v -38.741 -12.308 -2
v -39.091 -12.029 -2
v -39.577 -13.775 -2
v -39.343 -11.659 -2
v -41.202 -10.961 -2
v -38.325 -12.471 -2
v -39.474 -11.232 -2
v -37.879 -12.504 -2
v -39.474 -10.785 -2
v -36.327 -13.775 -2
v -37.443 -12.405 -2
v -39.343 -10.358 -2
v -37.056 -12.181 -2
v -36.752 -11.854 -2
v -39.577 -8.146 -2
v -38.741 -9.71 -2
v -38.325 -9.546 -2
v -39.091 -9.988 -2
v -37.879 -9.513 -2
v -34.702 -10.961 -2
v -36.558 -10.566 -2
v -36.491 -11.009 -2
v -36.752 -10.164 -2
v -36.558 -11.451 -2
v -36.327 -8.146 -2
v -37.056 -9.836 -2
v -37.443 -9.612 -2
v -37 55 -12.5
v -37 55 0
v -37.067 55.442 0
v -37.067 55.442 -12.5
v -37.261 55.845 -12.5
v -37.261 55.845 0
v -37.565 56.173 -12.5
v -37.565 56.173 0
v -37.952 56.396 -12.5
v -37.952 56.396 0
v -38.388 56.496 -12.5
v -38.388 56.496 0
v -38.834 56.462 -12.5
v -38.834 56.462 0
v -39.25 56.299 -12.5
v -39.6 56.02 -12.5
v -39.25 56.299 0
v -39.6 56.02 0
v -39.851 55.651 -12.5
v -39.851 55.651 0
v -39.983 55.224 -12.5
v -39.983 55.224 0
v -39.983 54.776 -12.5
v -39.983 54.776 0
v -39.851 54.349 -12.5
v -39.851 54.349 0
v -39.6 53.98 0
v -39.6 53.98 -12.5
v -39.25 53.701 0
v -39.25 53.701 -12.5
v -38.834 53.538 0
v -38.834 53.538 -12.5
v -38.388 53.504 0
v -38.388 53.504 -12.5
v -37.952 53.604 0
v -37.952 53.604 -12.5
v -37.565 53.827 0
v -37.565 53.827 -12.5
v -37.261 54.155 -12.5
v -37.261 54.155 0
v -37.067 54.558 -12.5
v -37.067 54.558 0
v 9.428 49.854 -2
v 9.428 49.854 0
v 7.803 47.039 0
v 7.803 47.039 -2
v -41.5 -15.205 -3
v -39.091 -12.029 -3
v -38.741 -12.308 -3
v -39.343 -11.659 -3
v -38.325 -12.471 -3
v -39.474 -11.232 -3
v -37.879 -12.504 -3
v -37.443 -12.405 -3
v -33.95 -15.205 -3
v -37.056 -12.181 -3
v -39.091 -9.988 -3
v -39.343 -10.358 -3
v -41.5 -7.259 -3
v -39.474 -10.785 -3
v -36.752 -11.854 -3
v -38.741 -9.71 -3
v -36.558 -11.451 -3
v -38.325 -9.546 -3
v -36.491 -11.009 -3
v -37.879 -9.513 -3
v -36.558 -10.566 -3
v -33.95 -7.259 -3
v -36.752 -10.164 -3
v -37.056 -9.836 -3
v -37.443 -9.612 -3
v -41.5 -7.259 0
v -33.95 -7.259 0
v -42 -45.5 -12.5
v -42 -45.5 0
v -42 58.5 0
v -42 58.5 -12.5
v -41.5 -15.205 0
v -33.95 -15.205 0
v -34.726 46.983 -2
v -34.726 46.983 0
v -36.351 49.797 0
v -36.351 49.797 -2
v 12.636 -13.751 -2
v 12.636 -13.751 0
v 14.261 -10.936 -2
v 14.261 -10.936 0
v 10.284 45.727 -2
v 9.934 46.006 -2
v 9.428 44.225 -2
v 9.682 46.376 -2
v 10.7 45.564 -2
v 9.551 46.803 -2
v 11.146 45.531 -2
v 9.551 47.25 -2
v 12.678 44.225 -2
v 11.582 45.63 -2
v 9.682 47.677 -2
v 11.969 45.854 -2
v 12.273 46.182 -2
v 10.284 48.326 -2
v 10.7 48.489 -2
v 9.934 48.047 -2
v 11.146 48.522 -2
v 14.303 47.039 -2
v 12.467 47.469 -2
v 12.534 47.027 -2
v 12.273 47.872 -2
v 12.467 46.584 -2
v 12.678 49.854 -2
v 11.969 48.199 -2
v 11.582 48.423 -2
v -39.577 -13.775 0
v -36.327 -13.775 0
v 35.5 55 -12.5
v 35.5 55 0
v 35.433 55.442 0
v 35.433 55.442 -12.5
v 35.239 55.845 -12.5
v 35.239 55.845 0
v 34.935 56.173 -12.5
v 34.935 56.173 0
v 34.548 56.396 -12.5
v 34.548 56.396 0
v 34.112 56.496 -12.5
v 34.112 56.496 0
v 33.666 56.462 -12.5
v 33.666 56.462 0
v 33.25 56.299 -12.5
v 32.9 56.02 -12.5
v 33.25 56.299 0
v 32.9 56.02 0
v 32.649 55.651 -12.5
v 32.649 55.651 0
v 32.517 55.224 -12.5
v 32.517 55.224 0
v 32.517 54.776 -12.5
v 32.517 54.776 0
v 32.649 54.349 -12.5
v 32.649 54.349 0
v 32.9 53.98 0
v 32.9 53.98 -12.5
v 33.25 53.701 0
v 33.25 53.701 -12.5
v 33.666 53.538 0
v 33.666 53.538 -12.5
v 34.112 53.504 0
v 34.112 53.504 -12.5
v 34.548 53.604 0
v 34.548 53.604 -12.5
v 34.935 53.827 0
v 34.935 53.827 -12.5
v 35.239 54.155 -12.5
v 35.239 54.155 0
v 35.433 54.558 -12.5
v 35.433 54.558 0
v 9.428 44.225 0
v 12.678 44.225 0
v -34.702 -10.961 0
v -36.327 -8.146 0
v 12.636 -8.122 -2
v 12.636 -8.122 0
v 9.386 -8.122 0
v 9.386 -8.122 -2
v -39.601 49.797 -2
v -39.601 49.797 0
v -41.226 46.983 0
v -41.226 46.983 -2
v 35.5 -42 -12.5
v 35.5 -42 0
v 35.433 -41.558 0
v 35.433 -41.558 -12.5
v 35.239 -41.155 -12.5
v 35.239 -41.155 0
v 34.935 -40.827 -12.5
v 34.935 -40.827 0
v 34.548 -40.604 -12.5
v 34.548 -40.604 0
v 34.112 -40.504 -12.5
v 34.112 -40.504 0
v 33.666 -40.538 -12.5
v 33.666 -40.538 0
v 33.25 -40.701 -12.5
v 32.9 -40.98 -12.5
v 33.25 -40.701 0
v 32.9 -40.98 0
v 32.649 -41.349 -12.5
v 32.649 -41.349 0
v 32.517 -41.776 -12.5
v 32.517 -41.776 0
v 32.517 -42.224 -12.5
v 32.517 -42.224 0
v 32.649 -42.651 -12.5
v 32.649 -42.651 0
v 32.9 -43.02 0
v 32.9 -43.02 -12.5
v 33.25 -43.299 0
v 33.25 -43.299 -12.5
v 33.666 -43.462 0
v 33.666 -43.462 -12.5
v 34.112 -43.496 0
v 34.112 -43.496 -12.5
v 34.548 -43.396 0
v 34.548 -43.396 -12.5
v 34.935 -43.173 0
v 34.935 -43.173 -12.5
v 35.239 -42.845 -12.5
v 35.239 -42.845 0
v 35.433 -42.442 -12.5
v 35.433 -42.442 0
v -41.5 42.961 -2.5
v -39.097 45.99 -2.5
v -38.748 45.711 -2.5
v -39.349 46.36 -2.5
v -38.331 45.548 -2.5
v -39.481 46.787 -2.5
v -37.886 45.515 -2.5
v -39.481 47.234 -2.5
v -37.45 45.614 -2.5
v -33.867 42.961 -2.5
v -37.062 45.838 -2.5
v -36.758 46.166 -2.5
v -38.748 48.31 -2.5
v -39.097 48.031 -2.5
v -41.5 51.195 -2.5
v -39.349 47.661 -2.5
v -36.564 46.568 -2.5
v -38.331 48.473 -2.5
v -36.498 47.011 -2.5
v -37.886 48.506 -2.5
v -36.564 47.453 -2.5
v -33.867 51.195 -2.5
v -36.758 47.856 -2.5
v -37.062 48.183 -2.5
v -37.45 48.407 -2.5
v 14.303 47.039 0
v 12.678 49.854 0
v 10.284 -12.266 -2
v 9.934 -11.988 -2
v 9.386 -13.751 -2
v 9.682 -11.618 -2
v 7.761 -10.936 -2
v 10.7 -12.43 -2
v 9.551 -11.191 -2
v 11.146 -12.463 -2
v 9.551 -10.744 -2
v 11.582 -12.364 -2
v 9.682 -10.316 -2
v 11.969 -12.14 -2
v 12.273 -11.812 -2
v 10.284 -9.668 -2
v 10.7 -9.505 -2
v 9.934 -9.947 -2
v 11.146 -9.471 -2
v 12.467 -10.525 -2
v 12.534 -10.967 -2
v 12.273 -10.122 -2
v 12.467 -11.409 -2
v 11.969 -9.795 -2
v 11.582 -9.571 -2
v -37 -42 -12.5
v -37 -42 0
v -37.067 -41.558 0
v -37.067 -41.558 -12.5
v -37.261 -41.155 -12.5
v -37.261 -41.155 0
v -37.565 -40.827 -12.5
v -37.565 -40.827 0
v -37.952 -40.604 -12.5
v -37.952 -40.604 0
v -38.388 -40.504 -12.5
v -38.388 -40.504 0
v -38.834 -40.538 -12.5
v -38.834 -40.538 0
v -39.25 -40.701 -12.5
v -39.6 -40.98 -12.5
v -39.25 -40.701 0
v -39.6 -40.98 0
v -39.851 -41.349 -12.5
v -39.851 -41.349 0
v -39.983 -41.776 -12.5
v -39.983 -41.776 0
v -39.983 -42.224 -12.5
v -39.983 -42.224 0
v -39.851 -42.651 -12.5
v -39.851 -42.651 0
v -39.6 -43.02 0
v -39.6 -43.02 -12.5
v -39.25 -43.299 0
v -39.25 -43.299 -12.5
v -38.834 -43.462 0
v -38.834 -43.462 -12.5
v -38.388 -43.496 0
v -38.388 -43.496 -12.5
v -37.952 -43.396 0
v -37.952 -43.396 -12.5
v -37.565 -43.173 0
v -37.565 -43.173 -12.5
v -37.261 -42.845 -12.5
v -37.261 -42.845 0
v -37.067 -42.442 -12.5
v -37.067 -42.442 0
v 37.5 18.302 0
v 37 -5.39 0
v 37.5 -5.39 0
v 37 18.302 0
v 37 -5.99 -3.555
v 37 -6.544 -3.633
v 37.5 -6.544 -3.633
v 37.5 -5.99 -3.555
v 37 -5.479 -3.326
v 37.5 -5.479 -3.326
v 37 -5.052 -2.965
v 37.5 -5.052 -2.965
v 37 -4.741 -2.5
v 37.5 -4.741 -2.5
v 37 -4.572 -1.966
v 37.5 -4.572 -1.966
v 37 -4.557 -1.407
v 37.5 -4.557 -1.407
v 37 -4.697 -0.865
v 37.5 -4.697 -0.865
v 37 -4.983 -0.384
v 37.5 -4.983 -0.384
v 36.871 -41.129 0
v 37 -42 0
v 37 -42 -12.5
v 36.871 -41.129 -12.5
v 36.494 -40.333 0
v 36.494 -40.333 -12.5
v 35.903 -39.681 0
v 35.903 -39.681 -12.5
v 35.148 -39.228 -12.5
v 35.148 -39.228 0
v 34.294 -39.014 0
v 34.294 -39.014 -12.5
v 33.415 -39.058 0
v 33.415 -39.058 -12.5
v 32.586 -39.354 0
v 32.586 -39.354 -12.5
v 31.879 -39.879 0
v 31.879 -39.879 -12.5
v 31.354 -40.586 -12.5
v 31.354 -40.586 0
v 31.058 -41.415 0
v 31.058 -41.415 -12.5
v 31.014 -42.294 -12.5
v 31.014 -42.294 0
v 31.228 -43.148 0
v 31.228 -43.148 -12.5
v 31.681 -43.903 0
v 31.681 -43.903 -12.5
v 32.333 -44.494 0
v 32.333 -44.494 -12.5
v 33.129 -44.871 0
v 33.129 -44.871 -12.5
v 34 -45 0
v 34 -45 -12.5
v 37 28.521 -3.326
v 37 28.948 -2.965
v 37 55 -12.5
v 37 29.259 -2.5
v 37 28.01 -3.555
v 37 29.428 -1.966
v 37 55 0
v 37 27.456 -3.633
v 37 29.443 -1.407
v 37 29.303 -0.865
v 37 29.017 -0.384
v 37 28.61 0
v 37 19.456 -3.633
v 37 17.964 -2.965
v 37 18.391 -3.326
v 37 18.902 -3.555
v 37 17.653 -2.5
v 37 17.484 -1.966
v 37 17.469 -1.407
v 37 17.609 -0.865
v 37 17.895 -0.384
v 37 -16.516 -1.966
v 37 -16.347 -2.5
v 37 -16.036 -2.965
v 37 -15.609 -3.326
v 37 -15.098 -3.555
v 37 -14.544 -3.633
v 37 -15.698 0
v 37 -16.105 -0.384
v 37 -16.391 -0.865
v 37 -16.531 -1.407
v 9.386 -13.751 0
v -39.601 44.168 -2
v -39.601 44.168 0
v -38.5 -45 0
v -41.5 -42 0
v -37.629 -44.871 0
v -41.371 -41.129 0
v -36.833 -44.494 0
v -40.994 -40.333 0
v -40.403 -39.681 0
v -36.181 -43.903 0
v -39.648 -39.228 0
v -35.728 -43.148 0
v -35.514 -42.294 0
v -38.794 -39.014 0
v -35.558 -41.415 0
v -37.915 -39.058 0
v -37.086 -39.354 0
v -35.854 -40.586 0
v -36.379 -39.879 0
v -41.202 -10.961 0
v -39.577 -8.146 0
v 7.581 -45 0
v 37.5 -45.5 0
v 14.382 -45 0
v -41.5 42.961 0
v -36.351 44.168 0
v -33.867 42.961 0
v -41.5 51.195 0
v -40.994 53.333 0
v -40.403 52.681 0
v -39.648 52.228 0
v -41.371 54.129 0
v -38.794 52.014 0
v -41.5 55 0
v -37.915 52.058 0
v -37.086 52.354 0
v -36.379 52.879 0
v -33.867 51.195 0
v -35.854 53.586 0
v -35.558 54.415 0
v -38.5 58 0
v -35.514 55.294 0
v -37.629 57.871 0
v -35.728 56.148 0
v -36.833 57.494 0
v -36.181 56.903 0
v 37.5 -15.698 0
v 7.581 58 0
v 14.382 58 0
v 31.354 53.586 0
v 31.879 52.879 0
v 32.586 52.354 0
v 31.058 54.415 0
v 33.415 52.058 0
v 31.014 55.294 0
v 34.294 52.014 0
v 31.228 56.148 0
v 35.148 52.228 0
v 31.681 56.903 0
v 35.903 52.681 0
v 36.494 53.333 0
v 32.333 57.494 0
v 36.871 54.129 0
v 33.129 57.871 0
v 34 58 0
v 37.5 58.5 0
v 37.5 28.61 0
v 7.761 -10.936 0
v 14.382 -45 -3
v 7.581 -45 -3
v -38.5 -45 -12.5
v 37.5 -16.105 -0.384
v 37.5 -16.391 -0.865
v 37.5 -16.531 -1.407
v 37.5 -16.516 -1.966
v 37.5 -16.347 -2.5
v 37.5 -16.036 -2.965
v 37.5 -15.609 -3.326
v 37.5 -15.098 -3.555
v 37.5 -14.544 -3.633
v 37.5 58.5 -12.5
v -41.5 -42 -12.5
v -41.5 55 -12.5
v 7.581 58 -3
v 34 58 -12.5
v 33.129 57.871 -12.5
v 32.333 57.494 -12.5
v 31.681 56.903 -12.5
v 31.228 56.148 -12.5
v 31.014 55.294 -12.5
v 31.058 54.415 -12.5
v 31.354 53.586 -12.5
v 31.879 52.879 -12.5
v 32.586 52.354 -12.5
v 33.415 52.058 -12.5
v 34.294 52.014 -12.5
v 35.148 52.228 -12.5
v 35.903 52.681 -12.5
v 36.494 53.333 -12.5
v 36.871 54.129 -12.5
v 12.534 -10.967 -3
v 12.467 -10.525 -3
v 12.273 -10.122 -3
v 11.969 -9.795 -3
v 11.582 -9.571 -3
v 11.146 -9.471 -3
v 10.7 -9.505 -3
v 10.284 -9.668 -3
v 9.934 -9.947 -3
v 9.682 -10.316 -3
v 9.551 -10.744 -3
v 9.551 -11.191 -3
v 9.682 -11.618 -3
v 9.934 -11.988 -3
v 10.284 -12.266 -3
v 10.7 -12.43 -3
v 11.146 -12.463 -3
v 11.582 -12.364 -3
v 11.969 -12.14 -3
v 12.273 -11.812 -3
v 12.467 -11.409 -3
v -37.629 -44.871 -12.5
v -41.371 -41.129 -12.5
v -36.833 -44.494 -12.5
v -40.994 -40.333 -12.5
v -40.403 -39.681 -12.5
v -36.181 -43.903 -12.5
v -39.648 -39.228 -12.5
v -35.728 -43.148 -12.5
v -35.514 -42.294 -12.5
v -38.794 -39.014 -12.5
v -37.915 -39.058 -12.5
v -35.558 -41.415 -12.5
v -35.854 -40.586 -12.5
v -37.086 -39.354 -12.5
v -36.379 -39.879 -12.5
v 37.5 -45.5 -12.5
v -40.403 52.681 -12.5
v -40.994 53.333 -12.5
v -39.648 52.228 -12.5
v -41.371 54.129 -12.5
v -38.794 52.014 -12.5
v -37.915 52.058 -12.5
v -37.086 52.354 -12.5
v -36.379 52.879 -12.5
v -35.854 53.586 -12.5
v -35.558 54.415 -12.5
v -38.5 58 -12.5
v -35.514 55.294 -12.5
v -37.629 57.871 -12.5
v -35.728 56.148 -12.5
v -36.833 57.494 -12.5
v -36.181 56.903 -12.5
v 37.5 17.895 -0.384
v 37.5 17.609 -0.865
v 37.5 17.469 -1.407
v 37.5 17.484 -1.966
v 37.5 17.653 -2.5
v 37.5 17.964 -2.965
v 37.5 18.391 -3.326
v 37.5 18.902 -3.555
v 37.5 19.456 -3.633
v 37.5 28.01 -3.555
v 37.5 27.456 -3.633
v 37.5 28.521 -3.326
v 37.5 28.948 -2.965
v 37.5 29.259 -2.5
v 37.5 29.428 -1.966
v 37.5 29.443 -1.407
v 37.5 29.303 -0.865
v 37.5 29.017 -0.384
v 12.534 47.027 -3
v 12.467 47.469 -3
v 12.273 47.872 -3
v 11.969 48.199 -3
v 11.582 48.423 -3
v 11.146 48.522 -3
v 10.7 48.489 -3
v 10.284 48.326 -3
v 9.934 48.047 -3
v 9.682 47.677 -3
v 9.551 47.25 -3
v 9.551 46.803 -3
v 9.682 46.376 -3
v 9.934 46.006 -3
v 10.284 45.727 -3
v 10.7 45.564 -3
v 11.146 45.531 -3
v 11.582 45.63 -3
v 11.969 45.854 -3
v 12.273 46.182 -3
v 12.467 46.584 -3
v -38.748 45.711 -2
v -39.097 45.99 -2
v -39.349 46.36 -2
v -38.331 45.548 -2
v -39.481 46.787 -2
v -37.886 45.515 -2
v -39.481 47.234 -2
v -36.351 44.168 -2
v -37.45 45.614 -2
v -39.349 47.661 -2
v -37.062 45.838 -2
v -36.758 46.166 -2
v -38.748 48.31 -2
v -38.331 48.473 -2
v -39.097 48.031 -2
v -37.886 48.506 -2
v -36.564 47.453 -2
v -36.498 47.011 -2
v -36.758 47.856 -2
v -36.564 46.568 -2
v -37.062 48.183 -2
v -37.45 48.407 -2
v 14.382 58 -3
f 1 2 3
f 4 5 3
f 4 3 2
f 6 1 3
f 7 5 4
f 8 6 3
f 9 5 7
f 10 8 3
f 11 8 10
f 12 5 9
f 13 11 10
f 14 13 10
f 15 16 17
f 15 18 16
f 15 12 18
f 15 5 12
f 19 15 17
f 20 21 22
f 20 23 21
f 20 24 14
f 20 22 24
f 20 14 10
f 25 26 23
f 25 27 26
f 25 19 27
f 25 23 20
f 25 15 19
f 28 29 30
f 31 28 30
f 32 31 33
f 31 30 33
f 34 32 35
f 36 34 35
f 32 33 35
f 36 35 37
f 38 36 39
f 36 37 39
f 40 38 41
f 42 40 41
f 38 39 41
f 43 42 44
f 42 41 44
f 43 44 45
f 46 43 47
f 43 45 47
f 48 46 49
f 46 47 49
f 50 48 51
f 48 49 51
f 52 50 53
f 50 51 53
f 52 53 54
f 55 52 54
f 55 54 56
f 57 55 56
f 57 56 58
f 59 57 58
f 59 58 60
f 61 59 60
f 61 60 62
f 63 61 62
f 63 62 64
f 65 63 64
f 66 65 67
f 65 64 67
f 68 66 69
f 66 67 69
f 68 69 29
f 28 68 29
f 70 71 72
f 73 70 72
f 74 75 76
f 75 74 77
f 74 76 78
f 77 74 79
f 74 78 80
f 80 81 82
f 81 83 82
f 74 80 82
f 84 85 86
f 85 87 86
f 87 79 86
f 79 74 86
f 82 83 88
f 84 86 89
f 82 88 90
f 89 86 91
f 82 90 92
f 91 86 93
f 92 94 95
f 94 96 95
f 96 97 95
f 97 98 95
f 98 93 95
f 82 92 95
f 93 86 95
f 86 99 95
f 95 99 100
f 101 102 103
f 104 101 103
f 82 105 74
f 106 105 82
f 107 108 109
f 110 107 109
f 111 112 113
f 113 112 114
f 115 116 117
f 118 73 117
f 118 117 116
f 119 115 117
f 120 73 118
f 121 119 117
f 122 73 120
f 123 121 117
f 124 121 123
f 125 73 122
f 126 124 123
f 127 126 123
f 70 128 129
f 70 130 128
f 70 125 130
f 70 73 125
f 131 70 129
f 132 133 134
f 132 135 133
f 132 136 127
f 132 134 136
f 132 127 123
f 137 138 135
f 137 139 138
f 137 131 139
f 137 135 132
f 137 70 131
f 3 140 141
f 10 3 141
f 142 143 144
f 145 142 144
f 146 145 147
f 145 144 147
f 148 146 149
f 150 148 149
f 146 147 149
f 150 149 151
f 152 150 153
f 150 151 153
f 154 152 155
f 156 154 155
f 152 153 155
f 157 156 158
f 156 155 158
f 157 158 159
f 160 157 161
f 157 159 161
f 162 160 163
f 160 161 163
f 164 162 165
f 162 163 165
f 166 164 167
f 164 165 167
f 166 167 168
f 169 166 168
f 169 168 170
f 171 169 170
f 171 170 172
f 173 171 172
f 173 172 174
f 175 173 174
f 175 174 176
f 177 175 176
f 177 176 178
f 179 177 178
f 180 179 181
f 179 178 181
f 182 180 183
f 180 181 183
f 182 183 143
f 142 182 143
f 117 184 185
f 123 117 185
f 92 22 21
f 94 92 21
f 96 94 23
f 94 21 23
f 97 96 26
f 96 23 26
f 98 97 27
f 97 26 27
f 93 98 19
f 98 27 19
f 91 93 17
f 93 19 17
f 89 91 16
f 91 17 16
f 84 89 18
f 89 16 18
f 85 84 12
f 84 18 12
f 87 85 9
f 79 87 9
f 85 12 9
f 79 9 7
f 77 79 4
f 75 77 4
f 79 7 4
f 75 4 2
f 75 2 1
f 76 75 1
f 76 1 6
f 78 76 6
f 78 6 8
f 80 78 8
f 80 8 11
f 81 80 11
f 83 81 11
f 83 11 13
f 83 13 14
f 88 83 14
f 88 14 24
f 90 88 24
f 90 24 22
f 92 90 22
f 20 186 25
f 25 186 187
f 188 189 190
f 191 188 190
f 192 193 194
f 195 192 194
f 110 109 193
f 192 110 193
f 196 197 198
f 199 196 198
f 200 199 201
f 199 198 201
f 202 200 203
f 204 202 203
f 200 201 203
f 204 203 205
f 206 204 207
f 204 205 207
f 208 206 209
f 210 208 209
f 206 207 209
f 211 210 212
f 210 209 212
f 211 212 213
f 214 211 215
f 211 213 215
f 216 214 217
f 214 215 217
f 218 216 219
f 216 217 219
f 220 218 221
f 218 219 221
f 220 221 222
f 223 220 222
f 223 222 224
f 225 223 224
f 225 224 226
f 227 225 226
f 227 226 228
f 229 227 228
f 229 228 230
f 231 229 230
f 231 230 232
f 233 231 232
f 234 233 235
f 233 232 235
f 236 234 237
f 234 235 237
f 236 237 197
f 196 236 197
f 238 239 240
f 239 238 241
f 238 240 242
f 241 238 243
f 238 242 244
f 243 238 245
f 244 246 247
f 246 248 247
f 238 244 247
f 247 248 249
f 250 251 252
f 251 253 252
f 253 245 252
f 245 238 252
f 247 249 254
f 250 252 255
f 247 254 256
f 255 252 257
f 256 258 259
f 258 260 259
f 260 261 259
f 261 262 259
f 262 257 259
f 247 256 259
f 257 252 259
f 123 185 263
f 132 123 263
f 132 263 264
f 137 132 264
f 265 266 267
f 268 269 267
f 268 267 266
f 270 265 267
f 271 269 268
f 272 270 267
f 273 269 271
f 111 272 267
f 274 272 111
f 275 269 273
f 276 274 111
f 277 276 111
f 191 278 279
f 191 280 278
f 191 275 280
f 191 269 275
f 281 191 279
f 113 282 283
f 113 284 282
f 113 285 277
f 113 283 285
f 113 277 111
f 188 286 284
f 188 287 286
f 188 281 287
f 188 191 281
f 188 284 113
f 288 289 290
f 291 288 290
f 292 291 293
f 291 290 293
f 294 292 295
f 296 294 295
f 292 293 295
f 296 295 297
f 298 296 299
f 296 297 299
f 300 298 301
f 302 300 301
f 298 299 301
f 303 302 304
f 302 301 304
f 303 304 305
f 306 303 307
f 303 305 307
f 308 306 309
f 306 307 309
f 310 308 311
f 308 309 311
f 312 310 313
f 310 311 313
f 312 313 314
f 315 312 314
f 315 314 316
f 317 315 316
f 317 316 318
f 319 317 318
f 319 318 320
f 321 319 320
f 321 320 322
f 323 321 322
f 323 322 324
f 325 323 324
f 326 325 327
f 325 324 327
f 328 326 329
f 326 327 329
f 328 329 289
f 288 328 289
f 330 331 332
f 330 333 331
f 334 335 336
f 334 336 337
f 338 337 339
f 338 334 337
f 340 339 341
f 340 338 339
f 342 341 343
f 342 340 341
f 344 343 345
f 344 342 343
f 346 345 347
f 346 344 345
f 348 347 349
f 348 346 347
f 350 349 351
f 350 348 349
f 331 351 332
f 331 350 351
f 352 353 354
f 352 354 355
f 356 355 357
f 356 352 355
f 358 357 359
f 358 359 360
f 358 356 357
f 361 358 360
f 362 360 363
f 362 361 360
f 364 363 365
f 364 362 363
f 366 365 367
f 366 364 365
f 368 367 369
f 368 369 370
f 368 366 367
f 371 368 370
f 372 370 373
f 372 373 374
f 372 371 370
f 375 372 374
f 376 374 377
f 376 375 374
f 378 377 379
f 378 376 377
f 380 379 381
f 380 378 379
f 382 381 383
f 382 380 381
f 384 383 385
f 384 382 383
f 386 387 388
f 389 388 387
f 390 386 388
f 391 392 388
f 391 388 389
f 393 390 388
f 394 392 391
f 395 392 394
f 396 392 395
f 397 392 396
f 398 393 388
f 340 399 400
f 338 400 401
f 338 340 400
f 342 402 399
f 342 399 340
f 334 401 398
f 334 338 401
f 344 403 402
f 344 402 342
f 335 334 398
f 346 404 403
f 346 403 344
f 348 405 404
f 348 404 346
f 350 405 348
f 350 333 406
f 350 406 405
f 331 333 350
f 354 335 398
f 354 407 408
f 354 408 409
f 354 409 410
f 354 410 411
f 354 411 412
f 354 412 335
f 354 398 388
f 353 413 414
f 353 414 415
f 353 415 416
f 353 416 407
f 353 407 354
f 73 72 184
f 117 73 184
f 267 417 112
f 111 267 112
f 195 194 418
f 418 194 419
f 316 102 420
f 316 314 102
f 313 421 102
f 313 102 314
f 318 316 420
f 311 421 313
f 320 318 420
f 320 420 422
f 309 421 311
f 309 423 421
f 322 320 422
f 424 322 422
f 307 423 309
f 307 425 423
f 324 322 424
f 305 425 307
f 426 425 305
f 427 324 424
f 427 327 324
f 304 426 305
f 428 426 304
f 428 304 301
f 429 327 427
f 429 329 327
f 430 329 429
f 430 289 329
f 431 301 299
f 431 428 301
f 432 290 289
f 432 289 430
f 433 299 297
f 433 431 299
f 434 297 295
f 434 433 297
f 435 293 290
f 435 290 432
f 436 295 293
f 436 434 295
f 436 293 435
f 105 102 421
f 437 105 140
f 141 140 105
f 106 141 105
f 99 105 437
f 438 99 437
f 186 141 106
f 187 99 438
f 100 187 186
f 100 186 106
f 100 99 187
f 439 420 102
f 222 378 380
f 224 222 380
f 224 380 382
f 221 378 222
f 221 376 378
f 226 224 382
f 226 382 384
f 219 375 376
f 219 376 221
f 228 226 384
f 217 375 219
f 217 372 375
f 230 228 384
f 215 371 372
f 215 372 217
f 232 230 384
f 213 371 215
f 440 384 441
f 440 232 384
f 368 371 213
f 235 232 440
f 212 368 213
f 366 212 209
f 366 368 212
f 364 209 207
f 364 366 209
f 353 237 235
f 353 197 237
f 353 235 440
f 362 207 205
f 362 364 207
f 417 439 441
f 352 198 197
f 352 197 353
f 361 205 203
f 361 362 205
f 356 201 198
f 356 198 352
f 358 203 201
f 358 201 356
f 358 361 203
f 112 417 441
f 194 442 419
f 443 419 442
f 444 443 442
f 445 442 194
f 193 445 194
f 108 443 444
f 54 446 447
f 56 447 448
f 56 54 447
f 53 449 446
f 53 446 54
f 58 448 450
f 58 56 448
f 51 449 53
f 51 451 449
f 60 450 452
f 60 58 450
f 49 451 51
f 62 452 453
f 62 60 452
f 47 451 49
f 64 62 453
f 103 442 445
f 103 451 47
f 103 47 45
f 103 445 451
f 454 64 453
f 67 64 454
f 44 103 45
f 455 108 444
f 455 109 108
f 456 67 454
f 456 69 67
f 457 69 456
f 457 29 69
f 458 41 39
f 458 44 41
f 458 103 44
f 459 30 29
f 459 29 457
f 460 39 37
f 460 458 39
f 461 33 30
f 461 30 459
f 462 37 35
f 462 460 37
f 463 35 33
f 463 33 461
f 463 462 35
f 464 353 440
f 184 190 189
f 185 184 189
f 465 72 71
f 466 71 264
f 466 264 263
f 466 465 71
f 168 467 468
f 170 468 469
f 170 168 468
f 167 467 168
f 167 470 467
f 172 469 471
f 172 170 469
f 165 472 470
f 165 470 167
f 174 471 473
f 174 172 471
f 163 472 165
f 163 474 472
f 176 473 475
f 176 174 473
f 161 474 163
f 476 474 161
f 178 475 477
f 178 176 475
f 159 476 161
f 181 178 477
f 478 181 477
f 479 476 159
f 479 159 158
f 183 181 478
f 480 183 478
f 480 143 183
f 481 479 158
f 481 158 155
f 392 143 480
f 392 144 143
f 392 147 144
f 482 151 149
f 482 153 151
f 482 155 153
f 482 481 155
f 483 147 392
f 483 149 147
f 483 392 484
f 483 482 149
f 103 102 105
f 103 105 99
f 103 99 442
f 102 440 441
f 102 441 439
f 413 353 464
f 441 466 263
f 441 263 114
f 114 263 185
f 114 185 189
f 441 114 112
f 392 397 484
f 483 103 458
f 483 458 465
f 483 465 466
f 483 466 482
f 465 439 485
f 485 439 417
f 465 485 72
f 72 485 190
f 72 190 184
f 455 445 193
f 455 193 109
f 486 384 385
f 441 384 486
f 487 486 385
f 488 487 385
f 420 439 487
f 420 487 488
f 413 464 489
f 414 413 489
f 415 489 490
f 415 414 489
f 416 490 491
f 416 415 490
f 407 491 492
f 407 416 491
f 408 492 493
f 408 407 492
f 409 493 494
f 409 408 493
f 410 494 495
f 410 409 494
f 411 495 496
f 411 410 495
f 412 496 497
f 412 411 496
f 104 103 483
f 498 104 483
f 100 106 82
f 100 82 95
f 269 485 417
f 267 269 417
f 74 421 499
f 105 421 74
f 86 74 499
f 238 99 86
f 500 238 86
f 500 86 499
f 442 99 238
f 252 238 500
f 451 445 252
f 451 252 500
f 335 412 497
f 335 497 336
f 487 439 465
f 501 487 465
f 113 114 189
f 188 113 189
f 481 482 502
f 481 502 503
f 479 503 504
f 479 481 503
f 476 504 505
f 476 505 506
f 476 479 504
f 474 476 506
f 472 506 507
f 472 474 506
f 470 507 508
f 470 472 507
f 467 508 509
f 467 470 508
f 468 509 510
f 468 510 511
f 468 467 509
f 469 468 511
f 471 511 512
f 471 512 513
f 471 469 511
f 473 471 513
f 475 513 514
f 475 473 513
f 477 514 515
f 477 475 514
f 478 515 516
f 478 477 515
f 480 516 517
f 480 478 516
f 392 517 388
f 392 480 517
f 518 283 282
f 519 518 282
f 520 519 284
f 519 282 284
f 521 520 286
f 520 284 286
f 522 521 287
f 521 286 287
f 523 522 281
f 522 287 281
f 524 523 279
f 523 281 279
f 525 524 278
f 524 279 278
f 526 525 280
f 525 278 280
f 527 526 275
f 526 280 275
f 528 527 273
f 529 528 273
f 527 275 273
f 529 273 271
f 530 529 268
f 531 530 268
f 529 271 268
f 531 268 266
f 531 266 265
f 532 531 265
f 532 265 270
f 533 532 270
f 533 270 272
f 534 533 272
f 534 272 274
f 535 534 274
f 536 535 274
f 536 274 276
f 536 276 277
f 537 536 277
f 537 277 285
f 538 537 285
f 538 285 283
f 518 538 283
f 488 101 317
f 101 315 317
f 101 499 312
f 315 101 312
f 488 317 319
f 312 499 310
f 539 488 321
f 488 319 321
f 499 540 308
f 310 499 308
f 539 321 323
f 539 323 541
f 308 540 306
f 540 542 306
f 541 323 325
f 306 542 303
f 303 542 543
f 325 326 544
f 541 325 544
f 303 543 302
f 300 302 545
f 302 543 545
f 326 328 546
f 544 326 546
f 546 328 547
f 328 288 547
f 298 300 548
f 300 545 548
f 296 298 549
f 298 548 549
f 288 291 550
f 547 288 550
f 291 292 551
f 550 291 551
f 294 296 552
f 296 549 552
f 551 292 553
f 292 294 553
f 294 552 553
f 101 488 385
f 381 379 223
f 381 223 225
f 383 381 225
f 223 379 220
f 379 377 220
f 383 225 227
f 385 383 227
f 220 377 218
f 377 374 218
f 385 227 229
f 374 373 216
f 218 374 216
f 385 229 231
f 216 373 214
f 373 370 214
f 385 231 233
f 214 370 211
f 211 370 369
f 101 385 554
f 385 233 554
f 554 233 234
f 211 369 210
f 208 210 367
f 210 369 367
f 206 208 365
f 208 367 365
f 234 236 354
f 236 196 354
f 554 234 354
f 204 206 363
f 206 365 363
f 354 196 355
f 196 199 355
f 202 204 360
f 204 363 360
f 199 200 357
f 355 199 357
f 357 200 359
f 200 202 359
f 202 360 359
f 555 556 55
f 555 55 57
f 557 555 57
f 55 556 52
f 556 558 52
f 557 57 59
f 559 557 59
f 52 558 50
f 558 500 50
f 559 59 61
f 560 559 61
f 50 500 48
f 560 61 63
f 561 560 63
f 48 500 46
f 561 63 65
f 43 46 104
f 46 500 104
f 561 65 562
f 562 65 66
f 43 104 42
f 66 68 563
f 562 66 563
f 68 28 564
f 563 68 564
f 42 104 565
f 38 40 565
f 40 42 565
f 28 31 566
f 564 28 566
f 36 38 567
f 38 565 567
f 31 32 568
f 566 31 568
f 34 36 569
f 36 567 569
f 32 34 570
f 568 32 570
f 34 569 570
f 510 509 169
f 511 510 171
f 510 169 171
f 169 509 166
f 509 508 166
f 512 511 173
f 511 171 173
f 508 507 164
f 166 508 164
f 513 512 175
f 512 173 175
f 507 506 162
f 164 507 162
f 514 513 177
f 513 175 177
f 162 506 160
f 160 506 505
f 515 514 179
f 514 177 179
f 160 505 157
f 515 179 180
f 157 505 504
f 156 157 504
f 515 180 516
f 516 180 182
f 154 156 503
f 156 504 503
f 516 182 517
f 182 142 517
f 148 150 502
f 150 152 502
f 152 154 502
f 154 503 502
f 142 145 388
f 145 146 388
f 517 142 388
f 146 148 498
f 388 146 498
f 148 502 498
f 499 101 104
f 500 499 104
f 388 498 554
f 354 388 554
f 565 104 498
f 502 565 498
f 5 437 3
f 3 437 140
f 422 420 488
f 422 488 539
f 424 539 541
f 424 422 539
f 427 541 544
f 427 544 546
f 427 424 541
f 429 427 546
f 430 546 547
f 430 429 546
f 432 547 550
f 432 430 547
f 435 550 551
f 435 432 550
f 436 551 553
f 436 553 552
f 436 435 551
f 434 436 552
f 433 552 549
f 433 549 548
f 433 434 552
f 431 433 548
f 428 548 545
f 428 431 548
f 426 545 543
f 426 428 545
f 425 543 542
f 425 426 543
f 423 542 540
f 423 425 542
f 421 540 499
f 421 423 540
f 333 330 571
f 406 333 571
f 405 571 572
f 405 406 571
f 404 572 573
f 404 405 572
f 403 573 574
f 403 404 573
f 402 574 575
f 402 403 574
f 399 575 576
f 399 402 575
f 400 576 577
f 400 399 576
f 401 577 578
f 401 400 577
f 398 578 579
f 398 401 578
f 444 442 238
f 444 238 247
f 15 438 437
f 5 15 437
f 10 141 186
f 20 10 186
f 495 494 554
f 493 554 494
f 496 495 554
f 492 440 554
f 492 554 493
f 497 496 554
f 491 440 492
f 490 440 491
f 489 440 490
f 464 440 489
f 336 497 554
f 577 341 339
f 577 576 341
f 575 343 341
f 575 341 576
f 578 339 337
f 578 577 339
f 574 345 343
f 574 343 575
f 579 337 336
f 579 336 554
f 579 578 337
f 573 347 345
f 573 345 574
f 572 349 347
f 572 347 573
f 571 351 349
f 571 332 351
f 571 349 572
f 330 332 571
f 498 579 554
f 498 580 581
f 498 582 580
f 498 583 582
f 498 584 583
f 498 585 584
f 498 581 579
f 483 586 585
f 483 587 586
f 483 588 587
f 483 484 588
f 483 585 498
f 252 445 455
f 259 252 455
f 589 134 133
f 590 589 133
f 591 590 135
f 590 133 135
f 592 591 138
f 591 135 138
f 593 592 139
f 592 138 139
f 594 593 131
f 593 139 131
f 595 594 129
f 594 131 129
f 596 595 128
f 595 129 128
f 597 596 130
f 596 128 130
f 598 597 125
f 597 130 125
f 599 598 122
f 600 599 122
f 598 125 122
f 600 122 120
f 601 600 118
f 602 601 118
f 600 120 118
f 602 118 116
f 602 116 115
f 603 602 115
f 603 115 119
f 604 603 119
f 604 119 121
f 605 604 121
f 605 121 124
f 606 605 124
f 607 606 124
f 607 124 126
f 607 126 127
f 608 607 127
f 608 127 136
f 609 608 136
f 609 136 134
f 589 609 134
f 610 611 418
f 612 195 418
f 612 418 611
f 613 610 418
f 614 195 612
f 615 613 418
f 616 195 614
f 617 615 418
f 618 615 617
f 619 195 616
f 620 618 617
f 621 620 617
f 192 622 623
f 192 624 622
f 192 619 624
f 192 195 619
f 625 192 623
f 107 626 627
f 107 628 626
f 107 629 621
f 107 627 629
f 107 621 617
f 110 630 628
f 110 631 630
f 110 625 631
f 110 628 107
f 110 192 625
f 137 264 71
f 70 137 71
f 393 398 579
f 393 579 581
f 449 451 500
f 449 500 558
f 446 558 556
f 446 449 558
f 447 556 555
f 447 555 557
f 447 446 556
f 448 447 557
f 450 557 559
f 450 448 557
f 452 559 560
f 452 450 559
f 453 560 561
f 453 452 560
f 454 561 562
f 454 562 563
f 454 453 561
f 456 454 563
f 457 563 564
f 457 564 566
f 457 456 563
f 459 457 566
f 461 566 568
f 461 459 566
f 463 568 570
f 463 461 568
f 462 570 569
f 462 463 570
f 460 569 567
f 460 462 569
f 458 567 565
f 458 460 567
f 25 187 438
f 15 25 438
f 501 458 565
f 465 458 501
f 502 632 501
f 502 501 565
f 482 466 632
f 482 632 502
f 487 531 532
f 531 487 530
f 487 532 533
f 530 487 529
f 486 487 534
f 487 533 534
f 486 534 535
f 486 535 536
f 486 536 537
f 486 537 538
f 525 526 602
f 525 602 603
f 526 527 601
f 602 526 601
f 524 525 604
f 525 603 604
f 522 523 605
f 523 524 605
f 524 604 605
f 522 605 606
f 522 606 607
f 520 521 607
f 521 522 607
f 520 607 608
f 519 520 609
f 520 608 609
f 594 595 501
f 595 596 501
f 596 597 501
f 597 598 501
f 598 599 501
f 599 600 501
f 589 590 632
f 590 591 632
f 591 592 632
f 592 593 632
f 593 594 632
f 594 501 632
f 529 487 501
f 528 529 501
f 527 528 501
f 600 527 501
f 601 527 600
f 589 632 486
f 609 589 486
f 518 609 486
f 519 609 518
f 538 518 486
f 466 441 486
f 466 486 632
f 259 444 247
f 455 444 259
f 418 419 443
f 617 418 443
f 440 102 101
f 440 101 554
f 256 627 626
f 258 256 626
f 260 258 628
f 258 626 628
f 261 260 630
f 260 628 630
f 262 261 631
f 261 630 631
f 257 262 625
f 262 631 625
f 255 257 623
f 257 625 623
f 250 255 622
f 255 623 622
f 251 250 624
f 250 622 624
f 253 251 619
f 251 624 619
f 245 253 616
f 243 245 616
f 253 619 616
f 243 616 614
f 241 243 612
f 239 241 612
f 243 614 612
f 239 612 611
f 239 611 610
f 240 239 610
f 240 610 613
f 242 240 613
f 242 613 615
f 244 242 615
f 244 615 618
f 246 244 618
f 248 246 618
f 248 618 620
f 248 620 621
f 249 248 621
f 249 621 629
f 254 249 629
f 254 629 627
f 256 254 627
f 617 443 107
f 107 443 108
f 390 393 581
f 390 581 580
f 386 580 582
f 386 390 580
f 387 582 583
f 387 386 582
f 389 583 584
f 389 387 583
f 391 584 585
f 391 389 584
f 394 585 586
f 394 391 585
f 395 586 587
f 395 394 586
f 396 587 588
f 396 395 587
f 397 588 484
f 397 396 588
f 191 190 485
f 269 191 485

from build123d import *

# Parameters (mm, degrees)
SKETCH002_W     = 79.5
SKETCH002_H     = 104
SKETCH002_R     = 1.5
PAD002_DEPTH    = 12.5
SKETCH_W        = 8.021301
SKETCH_H        = 8.234894
SKETCH_R        = 1.5
PAD_DEPTH       = 2.5
POCKET_DEPTH    = 2
SKETCH033_W     = 7.946812
SKETCH033_H     = 7.946812
SKETCH033_R     = 1.5
PAD003_DEPTH    = 3
SKETCH034_W     = 6.801386
SKETCH034_H     = 103.670945
SKETCH034_R     = 1.5
PAD004_DEPTH    = 3
POCKET001_DEPTH = 2
POCKET002_DEPTH = 2
POCKET003_DEPTH = 2
POCKET027_DEPTH = 0.5


with BuildPart() as part:
    # Sketch002 → Pad002 (new body)
    with BuildSketch(Plane.XY):
        with Locations((-2.25, 6.5)):
            Rectangle(SKETCH002_W, SKETCH002_H)
        with Locations((-38.5, 55)):
            Circle(SKETCH002_R, mode=Mode.SUBTRACT)
        with Locations((34, 55)):
            Circle(SKETCH002_R, mode=Mode.SUBTRACT)
        with Locations((-38.5, -42)):
            Circle(SKETCH002_R, mode=Mode.SUBTRACT)
        with Locations((34, -42)):
            Circle(SKETCH002_R, mode=Mode.SUBTRACT)
        with BuildLine():
            Line((34, -45), (-38.5, -45))
            ThreePointArc((-38.5, -45), (-36.37868, -39.87868), (-41.5, -42))
            Line((-41.5, -42), (-41.5, 55))
            ThreePointArc((-41.5, 55), (-36.37868, 52.87868), (-38.5, 58))
            Line((-38.5, 58), (34, 58))
            ThreePointArc((34, 58), (31.87868, 52.87868), (37, 55))
            Line((37, 55), (37, -42))
            ThreePointArc((37, -42), (31.87868, -39.87868), (34, -45))
        make_face(mode=Mode.SUBTRACT)
    extrude(amount=-PAD002_DEPTH)

    # Sketch → Pad (join)
    with BuildSketch(Plane.XY):
        with Locations((-37.87762, 47.077984)):
            Rectangle(SKETCH_W, SKETCH_H)
        with Locations((-37.997646, 47.010536)):
            Circle(SKETCH_R, mode=Mode.SUBTRACT)
    extrude(amount=-PAD_DEPTH)

    # Sketch032 (on Face23 of Pad) → Pocket (cut)
    with BuildSketch(Plane.XY):
        Polygon((-34.726036, 46.982567), (-36.351036, 49.79715), (-39.601036, 49.79715), (-41.226036, 46.982567), (-39.601036, 44.167984), (-36.351036, 44.167984), align=None)
    extrude(amount=-POCKET_DEPTH, mode=Mode.SUBTRACT)

    # Sketch033 → Pad003 (join)
    with BuildSketch(Plane.XY):
        with Locations((-37.923063, -11.232048)):
            Rectangle(SKETCH033_W, SKETCH033_H)
        with Locations((-37.99107, -11.008605)):
            Circle(SKETCH033_R, mode=Mode.SUBTRACT)
    extrude(amount=-PAD003_DEPTH)

    # Sketch034 → Pad004 (join)
    with BuildSketch(Plane.XY):
        with Locations((10.981288, 6.512218)):
            Rectangle(SKETCH034_W, SKETCH034_H)
        with Locations((11.033937, 47.026531)):
            Circle(SKETCH034_R, mode=Mode.SUBTRACT)
        with Locations((11.033937, -10.967275)):
            Circle(SKETCH034_R, mode=Mode.SUBTRACT)
    extrude(amount=-PAD004_DEPTH)

    # Sketch035 (on Face34 of Pad004) → Pocket001 (cut)
    with BuildSketch(Plane.XY):
        Polygon((-36.326836, -8.14599), (-39.576836, -8.14599), (-41.201836, -10.960573), (-39.576836, -13.775156), (-36.326836, -13.775156), (-34.701836, -10.960573), align=None)
    extrude(amount=-POCKET001_DEPTH, mode=Mode.SUBTRACT)

    # Sketch036 (on Face26 of Pocket001) → Pocket002 (cut)
    with BuildSketch(Plane.XY):
        Polygon((12.678073, 49.85376), (9.428073, 49.85376), (7.803073, 47.039177), (9.428073, 44.224594), (12.678073, 44.224594), (14.303073, 47.039177), align=None)
    extrude(amount=-POCKET002_DEPTH, mode=Mode.SUBTRACT)

    # Sketch037 (on Face26 of Pocket002) → Pocket003 (cut)
    with BuildSketch(Plane.XY):
        Polygon((12.636199, -8.121596), (9.386199, -8.121596), (7.761199, -10.936179), (9.386199, -13.750762), (12.636199, -13.750762), (14.261199, -10.936179), align=None)
    extrude(amount=-POCKET003_DEPTH, mode=Mode.SUBTRACT)

    # Sketch058 → Pocket027 (cut)
    with BuildSketch(Plane.YZ.offset(37)):
        with BuildLine():
            ThreePointArc((-14.544005, 0.366508), (-16.544005, -1.633492), (-14.544005, -3.633492))
            Line((-14.544005, -3.633492), (-6.544005, -3.633492))
            ThreePointArc((-6.544005, -3.633492), (-4.544005, -1.633492), (-6.544005, 0.366508))
            Line((-6.544005, 0.366508), (-14.544005, 0.366508))
        make_face()
        with BuildLine():
            ThreePointArc((19.455995, 0.366508), (17.455995, -1.633492), (19.455995, -3.633492))
            Line((19.455995, -3.633492), (27.455995, -3.633492))
            ThreePointArc((27.455995, -3.633492), (29.455995, -1.633492), (27.455995, 0.366508))
            Line((27.455995, 0.366508), (19.455995, 0.366508))
        make_face()
    extrude(amount=POCKET027_DEPTH, mode=Mode.SUBTRACT)


solid = part.part
